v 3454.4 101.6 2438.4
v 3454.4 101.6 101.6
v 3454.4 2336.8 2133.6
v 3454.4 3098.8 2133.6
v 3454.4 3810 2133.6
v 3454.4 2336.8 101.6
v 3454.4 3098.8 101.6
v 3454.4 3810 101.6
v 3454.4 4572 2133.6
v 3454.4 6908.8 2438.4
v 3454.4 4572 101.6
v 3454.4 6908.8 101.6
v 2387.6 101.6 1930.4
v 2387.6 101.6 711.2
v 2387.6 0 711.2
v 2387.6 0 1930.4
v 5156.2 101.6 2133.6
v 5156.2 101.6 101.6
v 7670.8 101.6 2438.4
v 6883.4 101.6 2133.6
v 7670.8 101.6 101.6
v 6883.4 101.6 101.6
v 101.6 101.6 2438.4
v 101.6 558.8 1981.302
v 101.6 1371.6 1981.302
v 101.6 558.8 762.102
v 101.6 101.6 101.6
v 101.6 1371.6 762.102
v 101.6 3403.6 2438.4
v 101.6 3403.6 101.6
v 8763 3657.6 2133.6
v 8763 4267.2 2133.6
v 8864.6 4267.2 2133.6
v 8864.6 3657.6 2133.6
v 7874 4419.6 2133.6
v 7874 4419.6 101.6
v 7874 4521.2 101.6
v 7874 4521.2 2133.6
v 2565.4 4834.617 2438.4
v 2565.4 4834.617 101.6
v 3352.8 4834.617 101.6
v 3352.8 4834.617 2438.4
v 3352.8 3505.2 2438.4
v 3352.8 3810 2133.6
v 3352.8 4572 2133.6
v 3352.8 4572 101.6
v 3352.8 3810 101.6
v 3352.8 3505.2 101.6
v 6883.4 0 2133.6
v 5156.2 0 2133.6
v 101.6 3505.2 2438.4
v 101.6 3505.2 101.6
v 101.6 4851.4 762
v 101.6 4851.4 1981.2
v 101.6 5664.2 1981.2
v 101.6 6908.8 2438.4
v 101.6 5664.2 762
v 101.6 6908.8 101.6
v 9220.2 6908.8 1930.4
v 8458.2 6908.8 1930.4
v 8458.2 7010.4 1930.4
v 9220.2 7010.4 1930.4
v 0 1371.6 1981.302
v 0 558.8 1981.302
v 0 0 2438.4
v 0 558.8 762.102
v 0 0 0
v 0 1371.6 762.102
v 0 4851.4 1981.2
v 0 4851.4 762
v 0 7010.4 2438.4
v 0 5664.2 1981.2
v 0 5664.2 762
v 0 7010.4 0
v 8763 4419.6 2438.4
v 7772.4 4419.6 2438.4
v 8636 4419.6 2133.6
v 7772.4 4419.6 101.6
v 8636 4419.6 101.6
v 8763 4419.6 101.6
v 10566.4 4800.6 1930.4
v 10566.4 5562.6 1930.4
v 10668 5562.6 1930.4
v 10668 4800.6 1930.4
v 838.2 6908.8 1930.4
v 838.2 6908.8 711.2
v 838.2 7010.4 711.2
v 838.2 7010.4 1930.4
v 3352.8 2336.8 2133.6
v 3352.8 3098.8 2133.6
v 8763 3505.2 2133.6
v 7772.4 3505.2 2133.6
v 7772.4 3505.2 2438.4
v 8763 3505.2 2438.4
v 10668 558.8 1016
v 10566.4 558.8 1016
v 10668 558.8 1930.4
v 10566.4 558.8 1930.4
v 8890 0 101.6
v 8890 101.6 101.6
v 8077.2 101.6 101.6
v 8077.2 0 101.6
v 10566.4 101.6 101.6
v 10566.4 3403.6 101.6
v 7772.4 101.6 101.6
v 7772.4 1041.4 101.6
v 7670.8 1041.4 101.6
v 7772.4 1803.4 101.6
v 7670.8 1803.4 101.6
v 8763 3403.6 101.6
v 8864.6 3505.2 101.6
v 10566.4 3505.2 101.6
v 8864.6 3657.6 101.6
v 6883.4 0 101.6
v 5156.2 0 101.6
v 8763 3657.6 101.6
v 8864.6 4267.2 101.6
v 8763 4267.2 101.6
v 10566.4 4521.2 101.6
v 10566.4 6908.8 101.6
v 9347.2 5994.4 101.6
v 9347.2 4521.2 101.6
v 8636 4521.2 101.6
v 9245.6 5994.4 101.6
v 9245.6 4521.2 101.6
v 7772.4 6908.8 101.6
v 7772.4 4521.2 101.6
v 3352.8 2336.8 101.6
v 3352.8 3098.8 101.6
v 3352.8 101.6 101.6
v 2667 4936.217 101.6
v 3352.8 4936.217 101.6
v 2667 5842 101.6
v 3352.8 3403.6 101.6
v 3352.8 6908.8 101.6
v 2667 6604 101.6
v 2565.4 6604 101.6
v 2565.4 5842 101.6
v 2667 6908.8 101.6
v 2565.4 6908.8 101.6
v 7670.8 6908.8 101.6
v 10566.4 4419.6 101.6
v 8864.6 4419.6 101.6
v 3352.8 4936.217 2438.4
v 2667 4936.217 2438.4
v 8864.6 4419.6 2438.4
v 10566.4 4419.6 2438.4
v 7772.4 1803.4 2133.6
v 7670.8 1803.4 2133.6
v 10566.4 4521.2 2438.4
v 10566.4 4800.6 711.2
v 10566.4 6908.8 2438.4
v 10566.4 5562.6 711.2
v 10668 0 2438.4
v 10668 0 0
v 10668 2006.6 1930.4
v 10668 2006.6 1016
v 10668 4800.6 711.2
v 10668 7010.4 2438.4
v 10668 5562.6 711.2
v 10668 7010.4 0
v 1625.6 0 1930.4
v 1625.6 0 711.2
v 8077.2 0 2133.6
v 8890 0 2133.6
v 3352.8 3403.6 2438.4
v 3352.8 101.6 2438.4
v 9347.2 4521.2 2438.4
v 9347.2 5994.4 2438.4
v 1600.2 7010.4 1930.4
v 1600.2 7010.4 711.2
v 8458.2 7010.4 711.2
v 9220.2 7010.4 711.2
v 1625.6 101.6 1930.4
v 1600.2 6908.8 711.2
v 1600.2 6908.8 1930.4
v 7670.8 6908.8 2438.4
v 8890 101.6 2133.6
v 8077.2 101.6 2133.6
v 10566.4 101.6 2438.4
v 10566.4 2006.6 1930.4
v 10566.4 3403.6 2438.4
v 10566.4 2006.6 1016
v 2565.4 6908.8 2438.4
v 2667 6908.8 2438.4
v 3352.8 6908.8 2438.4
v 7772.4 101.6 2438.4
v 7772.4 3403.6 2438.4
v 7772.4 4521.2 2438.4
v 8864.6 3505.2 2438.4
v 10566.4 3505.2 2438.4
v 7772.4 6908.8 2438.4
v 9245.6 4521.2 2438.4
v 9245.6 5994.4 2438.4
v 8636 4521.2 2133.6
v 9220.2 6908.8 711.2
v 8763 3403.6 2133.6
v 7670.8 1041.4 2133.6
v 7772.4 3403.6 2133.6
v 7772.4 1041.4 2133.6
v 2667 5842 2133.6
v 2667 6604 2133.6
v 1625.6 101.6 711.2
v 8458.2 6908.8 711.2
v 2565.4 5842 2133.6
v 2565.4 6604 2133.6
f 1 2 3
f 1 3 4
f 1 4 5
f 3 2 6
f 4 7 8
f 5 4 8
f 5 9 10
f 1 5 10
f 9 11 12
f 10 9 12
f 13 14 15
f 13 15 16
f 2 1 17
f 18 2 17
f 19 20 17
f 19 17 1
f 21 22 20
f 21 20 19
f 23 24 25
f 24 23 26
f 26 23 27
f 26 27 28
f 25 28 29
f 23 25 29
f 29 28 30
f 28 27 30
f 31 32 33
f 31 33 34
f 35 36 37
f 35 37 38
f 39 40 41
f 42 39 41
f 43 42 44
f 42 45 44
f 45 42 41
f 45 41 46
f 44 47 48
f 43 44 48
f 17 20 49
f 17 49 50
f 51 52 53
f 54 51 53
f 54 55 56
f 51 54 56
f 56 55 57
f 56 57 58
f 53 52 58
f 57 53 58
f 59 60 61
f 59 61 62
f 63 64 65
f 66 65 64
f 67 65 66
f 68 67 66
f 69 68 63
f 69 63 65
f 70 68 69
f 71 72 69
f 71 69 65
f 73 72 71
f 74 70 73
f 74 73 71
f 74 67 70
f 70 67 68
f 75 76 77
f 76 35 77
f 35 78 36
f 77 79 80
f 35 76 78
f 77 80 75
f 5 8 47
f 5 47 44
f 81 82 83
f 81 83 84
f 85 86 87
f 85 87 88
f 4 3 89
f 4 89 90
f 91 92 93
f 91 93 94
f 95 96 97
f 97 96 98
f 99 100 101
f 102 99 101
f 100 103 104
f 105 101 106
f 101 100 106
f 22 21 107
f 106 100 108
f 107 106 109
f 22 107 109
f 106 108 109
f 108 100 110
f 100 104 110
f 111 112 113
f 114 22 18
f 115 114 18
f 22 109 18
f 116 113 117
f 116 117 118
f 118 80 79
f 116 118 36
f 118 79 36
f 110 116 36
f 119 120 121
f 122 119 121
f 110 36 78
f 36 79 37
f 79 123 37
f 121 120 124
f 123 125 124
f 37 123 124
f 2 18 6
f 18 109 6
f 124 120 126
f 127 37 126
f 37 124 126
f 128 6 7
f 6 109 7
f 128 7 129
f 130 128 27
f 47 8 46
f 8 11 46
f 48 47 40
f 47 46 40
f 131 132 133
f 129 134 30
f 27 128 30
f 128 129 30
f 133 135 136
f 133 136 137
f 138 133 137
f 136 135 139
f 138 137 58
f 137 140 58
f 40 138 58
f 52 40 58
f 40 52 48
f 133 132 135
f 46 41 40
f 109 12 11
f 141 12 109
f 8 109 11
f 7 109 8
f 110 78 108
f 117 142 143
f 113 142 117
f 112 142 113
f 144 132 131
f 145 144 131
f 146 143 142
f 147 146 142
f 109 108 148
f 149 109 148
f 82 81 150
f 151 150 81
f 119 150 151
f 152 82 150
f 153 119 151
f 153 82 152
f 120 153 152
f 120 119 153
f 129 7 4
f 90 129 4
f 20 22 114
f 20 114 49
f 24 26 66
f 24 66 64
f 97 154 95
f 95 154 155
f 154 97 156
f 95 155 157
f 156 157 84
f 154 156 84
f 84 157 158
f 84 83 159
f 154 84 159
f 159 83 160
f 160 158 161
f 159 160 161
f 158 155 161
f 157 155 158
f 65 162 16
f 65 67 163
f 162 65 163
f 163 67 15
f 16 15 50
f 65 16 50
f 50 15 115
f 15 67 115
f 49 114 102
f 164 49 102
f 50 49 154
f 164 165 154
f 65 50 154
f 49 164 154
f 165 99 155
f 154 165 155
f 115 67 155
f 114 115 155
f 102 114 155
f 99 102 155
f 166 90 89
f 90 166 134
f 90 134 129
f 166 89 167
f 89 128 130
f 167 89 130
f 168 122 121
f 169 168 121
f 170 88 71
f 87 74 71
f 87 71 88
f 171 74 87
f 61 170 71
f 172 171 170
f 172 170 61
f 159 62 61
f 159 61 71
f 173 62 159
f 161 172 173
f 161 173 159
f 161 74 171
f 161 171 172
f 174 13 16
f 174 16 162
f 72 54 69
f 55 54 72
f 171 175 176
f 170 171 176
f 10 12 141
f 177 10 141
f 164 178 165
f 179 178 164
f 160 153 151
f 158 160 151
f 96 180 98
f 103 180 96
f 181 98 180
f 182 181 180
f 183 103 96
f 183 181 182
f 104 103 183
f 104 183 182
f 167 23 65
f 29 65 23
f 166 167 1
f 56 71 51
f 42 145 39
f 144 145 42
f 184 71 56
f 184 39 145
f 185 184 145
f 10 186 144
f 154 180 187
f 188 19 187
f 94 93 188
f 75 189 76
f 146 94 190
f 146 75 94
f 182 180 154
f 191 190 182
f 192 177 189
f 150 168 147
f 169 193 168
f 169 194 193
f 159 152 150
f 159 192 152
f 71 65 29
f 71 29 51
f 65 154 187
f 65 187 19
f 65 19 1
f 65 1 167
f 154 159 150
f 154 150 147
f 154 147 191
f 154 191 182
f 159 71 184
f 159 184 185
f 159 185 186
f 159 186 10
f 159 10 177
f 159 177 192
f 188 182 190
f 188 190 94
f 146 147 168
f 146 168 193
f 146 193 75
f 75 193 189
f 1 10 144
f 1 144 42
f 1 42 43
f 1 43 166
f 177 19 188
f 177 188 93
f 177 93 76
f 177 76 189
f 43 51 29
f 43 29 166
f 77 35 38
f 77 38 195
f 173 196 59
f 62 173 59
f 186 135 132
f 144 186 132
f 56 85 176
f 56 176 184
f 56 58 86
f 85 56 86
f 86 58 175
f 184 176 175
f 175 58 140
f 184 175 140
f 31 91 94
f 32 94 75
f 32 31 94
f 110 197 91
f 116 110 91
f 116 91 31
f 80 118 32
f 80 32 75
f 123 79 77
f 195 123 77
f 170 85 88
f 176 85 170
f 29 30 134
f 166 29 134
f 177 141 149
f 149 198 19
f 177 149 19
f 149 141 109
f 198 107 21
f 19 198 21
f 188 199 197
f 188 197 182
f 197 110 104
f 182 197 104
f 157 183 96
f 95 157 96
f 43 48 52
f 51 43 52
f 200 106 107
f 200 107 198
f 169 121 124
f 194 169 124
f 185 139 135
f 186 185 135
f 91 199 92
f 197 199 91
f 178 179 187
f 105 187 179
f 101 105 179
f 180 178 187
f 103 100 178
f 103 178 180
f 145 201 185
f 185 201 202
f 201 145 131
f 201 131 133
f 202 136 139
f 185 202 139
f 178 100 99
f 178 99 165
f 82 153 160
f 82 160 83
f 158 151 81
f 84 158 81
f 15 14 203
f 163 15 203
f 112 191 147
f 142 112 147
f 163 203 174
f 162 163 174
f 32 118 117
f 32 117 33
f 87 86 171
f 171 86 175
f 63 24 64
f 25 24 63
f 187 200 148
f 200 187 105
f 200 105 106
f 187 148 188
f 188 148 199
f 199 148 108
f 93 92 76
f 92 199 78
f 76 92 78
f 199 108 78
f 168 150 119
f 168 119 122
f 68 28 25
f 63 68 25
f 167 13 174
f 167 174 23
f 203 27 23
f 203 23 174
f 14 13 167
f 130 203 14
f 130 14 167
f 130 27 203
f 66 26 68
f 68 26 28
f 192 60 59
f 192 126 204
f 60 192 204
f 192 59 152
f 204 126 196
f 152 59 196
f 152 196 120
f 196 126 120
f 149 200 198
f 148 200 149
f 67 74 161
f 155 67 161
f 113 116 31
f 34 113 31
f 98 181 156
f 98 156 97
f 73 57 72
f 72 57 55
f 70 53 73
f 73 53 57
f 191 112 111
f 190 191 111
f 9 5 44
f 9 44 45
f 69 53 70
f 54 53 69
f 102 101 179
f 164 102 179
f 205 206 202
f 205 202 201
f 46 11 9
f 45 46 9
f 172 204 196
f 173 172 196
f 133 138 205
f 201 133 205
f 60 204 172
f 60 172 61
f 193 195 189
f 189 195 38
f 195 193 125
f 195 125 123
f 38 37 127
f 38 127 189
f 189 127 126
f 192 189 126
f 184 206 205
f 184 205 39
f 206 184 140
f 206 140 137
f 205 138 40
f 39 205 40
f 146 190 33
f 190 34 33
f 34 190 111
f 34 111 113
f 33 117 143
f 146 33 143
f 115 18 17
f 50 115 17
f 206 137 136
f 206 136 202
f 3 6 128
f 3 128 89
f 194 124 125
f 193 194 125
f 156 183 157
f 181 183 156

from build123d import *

# Parameters (mm, degrees)
F32_W     = 10668
F32_H     = 7010.4
F0_DEPTH  = 2438.4
F33_T     = -101.6
F1_W      = 990.6
F1_H      = 914.4
F2_DEPTH  = 2336.8
F34_W     = 812.8
F34_H     = 2032
F35_DEPTH = 101.6
F3_W      = 812.8
F3_H      = 1219.2
F4_DEPTH  = 101.6
F5_W      = 762
F5_H      = 1219.2
F36_DEPTH = 101.6
F6_W      = 762
F6_H      = 2032
F7_DEPTH  = 101.6
F8_W      = 1447.8
F8_H      = 914.4
F9_DEPTH  = 101.6
F10_W     = 762
F10_H     = 1219.2
F11_DEPTH = 101.6
F12_W     = 762
F12_H     = 1219.2
F13_DEPTH = 101.6
F14_W     = 762
F14_H     = 1219.2
F15_DEPTH = 101.6
F16_W     = 1727.2
F16_H     = 2032
F17_DEPTH = 101.6
F18_W     = 762
F18_H     = 2032
F19_DEPTH = 101.6
F20_W     = 812.8
F20_H     = 1219.2
F21_DEPTH = 101.6
F22_W     = 762
F22_H     = 2032
F23_DEPTH = 101.6
F24_W     = 762
F24_H     = 2032
F25_DEPTH = 101.6
F26_W     = 609.6
F26_H     = 2032
F27_DEPTH = 101.6
F28_W     = 990.6
F28_H     = 2032
F29_DEPTH = 101.6
F30_W     = 762
F30_H     = 2032
F31_DEPTH = 101.6


with BuildPart() as f0:
    # F32 (on Top) → F0 (new body)
    with BuildSketch(Plane.XY):
        with Locations((5334, 3505.2)):
            Rectangle(F32_W, F32_H)
    extrude(amount=F0_DEPTH)

    # F33
    f33_openings = [f0.faces().sort_by_distance(p)[0] for p in [
        (5334, 3505.2, 2438.4),
    ]]
    offset(amount=F33_T, openings=f33_openings)

    # F1 (on face) → F2 (join, through all)
    with BuildSketch(Plane.XY.offset(101.6)):
        Polygon((3352.8, 101.6), (3454.4, 101.6), (3454.4, 6908.8), (3352.8, 6908.8), (3352.8, 4936.2171379089), (3352.8, 4834.6171379089), (3352.8, 3505.2), (2667, 3505.2), (2565.4, 3505.2), (101.6, 3505.2), (101.6, 3403.6), (3352.8, 3403.6), align=None)
        Polygon((7772.4, 3403.6), (10566.4, 3403.6), (10566.4, 3505.2), (8864.6, 3505.2), (8864.6, 4419.6), (10566.4, 4419.6), (10566.4, 4521.2), (9347.2, 4521.2), (9347.2, 5994.4), (9245.6, 5994.4), (9245.6, 4521.2), (7772.4, 4521.2), (7772.4, 6908.8), (7670.8, 6908.8), (7670.8, 101.6), (7772.4, 101.6), align=None)
        with Locations((8267.7, 3962.4)):
            Rectangle(F1_W, F1_H, mode=Mode.SUBTRACT)
        Polygon((3352.8, 4834.6171379089), (3352.8, 4936.2171379089), (2667, 4936.2171379089), (2667, 6908.8), (2565.4, 6908.8), (2565.4, 4834.6171379089), align=None)
    extrude(amount=F2_DEPTH)

    # F34 (on face) → F35 (cut, through all)
    with BuildSketch(Plane(origin=(0, 101.6, 0), x_dir=(-1, 0, 0), z_dir=(0, 1, 0))):
        with Locations((-8483.6, 1117.6)):
            Rectangle(F34_W, F34_H)
    extrude(amount=-F35_DEPTH, mode=Mode.SUBTRACT)

    # F3 (on face) → F4 (cut, through all)
    with BuildSketch(Plane.YZ.offset(101.6)):
        with Locations((5257.8, 1371.6)):
            Rectangle(F3_W, F3_H)
    extrude(amount=-F4_DEPTH, mode=Mode.SUBTRACT)

    # F5 (on face) → F36 (cut, through all)
    with BuildSketch(Plane.XZ.offset(-6908.8)):
        with Locations((1219.2, 1320.8)):
            Rectangle(F5_W, F5_H)
    extrude(amount=-F36_DEPTH, mode=Mode.SUBTRACT)

    # F6 (on face) → F7 (cut, through all)
    with BuildSketch(Plane.YZ.offset(7772.4)):
        with Locations((1422.4, 1117.6)):
            Rectangle(F6_W, F6_H)
    extrude(amount=-F7_DEPTH, mode=Mode.SUBTRACT)

    # F8 (on face) → F9 (cut, through all)
    with BuildSketch(Plane(origin=(10566.4, 0, 0), x_dir=(0, -1, 0), z_dir=(-1, 0, 0))):
        with Locations((-1282.7, 1473.2)):
            Rectangle(F8_W, F8_H)
    extrude(amount=-F9_DEPTH, mode=Mode.SUBTRACT)

    # F10 (on face) → F11 (cut, through all)
    with BuildSketch(Plane.XZ.offset(-6908.8)):
        with Locations((8839.2, 1320.8)):
            Rectangle(F10_W, F10_H)
    extrude(amount=-F11_DEPTH, mode=Mode.SUBTRACT)

    # F12 (on face) → F13 (cut, through all)
    with BuildSketch(Plane(origin=(10566.4, 0, 0), x_dir=(0, -1, 0), z_dir=(-1, 0, 0))):
        with Locations((-5181.6, 1320.8)):
            Rectangle(F12_W, F12_H)
    extrude(amount=-F13_DEPTH, mode=Mode.SUBTRACT)

    # F14 (on face) → F15 (cut, through all)
    with BuildSketch(Plane(origin=(0, 101.6, 0), x_dir=(-1, 0, 0), z_dir=(0, 1, 0))):
        with Locations((-2006.6, 1320.8)):
            Rectangle(F14_W, F14_H)
    extrude(amount=-F15_DEPTH, mode=Mode.SUBTRACT)

    # F16 (on face) → F17 (cut, through all)
    with BuildSketch(Plane(origin=(0, 101.6, 0), x_dir=(-1, 0, 0), z_dir=(0, 1, 0))):
        with Locations((-6019.8, 1117.6)):
            Rectangle(F16_W, F16_H)
    extrude(amount=-F17_DEPTH, mode=Mode.SUBTRACT)

    # F18 (on face) → F19 (cut, through all)
    with BuildSketch(Plane(origin=(2565.4, 0, 0), x_dir=(0, -1, 0), z_dir=(-1, 0, 0))):
        with Locations((-6223, 1117.6)):
            Rectangle(F18_W, F18_H)
    extrude(amount=-F19_DEPTH, mode=Mode.SUBTRACT)

    # F20 (on face) → F21 (cut, through all)
    with BuildSketch(Plane.YZ.offset(101.6)):
        with Locations((965.2, 1371.7016)):
            Rectangle(F20_W, F20_H)
    extrude(amount=-F21_DEPTH, mode=Mode.SUBTRACT)

    # F22 (on face) → F23 (cut, through all)
    with BuildSketch(Plane.YZ.offset(3454.4)):
        with Locations((2717.8, 1117.6)):
            Rectangle(F22_W, F22_H)
    extrude(amount=-F23_DEPTH, mode=Mode.SUBTRACT)

    # F24 (on face) → F25 (cut, through all)
    with BuildSketch(Plane.YZ.offset(3454.4)):
        with Locations((4191, 1117.6)):
            Rectangle(F24_W, F24_H)
    extrude(amount=-F25_DEPTH, mode=Mode.SUBTRACT)

    # F26 (on face) → F27 (cut, through all)
    with BuildSketch(Plane(origin=(8763, 0, 0), x_dir=(0, -1, 0), z_dir=(-1, 0, 0))):
        with Locations((-3962.4, 1117.6)):
            Rectangle(F26_W, F26_H)
    extrude(amount=-F27_DEPTH, mode=Mode.SUBTRACT)

    # F28 (on face) → F29 (cut, through all)
    with BuildSketch(Plane.XZ.offset(-3403.6)):
        with Locations((8267.7, 1117.6)):
            Rectangle(F28_W, F28_H)
    extrude(amount=-F29_DEPTH, mode=Mode.SUBTRACT)

    # F30 (on face) → F31 (cut, through all)
    with BuildSketch(Plane.XZ.offset(-4419.6)):
        with Locations((8255, 1117.6)):
            Rectangle(F30_W, F30_H)
    extrude(amount=-F31_DEPTH, mode=Mode.SUBTRACT)


solid = f0.part
